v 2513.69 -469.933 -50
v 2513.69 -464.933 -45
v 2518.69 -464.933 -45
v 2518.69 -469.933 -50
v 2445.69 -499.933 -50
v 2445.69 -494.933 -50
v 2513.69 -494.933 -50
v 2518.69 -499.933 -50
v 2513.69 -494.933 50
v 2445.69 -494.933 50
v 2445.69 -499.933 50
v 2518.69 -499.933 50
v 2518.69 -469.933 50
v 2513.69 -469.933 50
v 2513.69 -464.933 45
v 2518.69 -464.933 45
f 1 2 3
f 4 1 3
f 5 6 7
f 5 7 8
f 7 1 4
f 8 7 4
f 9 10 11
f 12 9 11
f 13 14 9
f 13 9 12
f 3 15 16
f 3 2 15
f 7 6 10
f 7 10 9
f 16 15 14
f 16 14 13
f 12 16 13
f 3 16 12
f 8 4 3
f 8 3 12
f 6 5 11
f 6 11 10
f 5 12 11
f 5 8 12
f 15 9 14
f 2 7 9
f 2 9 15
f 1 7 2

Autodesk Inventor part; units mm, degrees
ref_plane "YZ Plane" through (0, 0, 0) normal (1, 0, 0) x (0, 1, 0)
ref_plane "XZ Plane" through (0, 0, 0) normal (0, 1, 0) x (-1, 0, 0)
ref_plane "XY Plane" through (0, 0, 0) normal (0, 0, 1) x (1, 0, 0)
sketch "Sketch1" plane through (0, 0, 0) normal (0, 0, 1) x (1, 0, 0)
  line L0 (2530.6901, -554.9334) -> (2513.6901, -554.9334)
  line L1 (2513.6901, -554.9334) -> (2445.6901, -499.9334)
  line L2 (2518.6901, -464.9334) -> (2518.6901, -499.9334)
  line L3 (2513.6901, -464.9334) -> (2518.6901, -464.9334)
  line L4 (2518.6901, -499.9334) -> (2445.6901, -499.9334)
  line L5 (2445.6901, -499.9334) -> (2445.6901, -494.9334)
  line L6 (2445.6901, -494.9334) -> (2513.6901, -494.9334)
  line L7 (2513.6901, -494.9334) -> (2513.6901, -464.9334)
  line L8 (2523.6901, -464.9334) -> (2535.6901, -505.2758)
  arc A0 (2530.6901, -554.9334) -> (2535.6901, -554.9334) centre (2533.1901, -550.6033) ccw
  line L9 (2523.6901, -464.9334) -> (2518.6901, -464.9334)
  line L10 (2535.6901, -554.9334) -> (2535.6901, -505.2758)
  arc A1 (2530.6901, -554.9334) -> (2535.6901, -554.9334) centre (2533.1901, -550.6033) ccw
  line L11 (2517.6901, -494.9334) -> (1996.6901, -494.9334)
  point P0 (0, 0)
  dimension "d5" = 5
  dimension "d6" = 35
extrude "Extrusion1" add sketch "Sketch1" along normal mid plane 100 contours L5 L6 L7 L3 L2 L4
chamfer "Chamfer1" distance 5 angle 45 2 edges at (2516.1901, -464.9334, 50) (2516.1901, -464.9334, -50)
properties part number "ADSK-MH-10040" material "Steel, Mild"
